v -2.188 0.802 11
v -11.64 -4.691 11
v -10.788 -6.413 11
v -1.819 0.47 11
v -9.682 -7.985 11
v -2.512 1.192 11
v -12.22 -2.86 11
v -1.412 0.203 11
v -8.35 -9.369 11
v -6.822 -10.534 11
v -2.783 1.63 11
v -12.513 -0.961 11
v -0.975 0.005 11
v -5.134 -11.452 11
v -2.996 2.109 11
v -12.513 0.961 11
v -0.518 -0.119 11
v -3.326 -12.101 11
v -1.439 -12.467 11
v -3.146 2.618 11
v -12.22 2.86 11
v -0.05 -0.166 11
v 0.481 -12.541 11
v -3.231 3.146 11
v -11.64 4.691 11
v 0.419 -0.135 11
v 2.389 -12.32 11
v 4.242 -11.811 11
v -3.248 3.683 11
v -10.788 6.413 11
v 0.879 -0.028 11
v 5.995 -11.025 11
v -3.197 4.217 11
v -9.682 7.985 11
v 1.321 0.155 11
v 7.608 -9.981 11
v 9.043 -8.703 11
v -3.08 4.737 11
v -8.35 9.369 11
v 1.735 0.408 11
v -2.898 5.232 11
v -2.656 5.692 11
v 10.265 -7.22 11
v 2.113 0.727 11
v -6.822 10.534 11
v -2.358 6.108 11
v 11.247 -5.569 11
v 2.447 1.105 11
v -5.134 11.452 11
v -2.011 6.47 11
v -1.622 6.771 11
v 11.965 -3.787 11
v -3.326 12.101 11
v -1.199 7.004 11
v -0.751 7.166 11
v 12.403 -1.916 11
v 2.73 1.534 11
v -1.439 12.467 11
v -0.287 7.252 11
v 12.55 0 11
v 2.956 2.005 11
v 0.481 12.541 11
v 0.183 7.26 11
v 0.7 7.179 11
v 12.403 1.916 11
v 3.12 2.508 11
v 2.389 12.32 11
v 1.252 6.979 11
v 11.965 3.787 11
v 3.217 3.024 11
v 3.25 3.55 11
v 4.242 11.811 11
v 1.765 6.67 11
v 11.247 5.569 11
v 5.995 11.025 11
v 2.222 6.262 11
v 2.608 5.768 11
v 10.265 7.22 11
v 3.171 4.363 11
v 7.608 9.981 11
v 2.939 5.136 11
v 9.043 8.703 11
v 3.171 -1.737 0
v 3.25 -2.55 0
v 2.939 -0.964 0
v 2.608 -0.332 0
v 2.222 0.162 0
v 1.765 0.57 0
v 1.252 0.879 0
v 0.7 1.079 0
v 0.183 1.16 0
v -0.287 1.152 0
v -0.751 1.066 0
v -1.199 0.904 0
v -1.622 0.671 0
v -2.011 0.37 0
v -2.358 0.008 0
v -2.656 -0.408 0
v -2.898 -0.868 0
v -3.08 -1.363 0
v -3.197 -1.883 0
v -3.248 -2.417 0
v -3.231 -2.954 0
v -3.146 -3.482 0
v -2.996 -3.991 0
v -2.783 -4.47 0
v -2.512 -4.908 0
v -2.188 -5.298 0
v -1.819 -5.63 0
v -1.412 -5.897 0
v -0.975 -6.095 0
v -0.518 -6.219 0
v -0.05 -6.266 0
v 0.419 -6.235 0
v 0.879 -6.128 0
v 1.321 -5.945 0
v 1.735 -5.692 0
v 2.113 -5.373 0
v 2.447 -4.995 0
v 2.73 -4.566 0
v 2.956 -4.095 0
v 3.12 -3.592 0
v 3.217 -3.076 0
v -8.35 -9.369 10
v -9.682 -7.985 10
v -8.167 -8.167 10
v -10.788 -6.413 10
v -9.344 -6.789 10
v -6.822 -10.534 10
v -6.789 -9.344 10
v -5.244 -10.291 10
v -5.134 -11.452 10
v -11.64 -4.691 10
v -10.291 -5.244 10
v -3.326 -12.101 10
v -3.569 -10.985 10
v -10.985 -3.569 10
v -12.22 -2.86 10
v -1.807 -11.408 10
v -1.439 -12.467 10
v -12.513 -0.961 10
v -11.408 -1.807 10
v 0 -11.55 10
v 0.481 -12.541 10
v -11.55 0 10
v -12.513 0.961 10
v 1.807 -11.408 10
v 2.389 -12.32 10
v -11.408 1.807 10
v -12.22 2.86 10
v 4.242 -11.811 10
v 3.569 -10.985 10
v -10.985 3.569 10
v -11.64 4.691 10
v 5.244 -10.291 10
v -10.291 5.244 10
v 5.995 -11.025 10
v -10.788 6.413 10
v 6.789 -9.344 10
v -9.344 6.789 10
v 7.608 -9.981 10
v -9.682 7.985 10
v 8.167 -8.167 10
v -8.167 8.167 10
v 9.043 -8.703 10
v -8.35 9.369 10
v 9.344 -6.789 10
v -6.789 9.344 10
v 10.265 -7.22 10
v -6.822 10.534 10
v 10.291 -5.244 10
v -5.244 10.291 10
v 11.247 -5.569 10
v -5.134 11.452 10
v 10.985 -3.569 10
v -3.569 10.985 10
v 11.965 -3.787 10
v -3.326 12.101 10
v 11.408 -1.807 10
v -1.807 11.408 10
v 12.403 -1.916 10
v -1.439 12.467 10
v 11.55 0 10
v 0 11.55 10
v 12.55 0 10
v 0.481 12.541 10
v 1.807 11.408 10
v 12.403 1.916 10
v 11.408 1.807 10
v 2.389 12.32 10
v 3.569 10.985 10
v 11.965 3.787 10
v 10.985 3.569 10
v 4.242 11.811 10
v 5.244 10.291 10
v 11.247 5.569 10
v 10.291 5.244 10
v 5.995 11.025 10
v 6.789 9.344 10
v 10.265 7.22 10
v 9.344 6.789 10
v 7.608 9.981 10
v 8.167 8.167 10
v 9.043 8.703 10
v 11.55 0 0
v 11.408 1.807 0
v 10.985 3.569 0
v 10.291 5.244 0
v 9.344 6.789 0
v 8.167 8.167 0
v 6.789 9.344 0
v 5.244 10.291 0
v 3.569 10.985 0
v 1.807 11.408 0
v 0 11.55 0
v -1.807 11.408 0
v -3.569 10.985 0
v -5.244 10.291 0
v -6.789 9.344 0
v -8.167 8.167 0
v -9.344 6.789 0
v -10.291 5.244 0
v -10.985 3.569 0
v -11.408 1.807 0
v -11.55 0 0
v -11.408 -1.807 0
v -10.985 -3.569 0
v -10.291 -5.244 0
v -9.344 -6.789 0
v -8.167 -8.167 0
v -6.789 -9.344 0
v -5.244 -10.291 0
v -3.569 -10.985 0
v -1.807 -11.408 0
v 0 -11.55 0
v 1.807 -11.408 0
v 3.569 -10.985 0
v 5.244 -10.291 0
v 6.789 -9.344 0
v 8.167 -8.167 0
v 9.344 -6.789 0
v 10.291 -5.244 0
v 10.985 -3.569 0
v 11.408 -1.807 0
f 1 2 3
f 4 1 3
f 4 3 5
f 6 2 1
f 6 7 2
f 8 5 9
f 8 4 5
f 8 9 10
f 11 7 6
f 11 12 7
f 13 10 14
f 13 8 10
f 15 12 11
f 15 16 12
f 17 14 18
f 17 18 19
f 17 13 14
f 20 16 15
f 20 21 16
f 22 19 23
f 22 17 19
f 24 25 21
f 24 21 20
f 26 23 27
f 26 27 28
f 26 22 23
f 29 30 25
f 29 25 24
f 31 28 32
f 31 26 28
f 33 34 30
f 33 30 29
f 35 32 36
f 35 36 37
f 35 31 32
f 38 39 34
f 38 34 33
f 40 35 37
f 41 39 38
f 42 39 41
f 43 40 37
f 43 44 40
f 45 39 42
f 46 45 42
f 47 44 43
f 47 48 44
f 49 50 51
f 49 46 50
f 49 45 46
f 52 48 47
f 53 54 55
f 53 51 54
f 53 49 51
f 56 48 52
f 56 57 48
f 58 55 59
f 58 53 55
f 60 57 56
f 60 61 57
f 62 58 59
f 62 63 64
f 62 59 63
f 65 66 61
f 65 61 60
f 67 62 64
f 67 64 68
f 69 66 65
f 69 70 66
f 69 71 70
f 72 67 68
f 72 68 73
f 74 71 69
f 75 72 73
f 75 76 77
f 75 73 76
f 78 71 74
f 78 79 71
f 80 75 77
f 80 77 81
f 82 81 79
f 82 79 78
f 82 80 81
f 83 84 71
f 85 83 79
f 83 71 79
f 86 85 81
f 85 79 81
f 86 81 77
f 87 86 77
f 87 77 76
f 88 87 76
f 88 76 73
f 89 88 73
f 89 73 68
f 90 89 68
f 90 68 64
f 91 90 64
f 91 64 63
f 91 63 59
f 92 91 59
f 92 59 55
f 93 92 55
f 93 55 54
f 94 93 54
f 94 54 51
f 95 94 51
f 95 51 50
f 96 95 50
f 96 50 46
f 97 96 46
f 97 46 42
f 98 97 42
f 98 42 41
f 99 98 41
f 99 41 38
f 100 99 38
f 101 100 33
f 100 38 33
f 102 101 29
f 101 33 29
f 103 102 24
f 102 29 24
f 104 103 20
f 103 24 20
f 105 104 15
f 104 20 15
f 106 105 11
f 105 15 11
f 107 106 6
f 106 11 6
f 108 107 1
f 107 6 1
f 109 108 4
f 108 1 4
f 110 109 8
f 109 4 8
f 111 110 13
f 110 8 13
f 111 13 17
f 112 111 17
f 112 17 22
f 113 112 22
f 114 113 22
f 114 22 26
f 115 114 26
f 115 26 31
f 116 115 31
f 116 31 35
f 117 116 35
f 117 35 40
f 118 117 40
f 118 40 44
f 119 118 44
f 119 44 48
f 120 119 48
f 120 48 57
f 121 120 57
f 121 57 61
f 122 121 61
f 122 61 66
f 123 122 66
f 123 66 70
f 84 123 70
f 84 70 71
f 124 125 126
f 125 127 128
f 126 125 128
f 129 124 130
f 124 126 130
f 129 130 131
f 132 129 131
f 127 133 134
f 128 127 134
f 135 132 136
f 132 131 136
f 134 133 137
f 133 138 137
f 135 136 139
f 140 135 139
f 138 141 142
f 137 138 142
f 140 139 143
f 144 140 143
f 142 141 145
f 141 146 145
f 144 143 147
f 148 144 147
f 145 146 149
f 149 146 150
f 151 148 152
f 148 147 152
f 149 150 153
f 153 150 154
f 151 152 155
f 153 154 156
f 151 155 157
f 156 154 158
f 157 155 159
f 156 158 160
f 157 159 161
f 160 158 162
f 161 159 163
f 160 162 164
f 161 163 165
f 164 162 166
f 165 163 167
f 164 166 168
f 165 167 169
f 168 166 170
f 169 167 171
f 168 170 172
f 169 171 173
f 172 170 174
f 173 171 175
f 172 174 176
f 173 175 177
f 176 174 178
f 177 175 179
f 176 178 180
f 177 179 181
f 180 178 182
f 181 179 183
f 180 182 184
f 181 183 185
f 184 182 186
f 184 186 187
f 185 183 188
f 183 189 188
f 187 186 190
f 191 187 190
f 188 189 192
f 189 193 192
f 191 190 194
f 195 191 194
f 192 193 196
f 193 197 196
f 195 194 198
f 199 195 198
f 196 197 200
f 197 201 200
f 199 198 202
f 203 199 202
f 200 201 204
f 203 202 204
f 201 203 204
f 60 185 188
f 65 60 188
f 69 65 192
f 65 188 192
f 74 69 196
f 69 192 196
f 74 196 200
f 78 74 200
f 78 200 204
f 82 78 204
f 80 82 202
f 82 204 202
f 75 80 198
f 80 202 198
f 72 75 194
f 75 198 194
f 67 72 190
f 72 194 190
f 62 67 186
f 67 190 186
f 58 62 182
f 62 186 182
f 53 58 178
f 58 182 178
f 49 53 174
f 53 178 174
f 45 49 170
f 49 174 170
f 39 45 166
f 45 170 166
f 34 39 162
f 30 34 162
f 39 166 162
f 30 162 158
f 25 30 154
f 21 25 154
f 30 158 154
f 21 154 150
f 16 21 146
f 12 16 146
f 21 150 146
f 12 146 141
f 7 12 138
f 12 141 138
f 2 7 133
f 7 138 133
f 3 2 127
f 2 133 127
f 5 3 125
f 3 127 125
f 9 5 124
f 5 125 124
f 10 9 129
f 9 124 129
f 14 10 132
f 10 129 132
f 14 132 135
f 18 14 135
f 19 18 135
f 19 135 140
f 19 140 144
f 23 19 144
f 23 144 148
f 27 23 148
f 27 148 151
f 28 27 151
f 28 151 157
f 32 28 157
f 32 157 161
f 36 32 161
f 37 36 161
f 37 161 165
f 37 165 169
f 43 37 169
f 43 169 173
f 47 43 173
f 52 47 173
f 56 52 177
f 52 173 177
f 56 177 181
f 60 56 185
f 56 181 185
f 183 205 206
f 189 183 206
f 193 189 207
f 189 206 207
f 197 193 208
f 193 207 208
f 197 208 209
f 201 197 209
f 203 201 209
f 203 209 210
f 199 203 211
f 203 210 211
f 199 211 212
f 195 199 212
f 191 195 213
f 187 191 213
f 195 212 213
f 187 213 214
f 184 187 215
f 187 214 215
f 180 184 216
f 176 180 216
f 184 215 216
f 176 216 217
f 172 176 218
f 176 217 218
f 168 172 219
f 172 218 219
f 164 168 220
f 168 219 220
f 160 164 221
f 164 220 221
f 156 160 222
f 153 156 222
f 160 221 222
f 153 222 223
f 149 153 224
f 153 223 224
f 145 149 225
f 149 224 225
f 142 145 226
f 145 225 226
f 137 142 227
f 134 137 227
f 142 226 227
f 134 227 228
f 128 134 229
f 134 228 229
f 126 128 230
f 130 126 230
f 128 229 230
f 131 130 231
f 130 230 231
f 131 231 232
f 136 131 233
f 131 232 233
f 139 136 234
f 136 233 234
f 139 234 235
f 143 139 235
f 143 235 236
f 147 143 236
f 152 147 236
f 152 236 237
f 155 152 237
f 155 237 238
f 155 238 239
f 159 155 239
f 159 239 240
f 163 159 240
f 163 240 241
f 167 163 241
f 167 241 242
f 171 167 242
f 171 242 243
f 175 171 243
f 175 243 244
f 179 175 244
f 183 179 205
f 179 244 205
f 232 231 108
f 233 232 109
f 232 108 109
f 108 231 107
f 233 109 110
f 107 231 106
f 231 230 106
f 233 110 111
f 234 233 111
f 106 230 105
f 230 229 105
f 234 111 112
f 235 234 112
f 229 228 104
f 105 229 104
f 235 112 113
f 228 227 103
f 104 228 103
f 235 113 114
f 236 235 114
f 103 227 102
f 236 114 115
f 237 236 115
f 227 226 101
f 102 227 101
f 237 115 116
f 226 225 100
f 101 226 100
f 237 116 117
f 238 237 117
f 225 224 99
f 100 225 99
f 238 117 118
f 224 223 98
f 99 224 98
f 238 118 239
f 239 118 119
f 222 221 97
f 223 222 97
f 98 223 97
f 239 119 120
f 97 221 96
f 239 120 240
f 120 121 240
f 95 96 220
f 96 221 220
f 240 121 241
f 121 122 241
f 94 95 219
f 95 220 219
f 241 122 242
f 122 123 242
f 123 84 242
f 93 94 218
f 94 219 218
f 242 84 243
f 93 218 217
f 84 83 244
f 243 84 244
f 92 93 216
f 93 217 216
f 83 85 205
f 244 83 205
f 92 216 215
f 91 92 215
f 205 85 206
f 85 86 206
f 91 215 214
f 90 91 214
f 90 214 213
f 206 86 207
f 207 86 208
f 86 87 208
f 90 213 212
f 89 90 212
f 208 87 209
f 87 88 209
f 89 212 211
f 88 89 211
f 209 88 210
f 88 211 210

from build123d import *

# Parameters (mm, degrees)
F0_R     = 11.55
F1_DEPTH = 10
F2_R     = 12.55
F2_R_2   = 11.55
F3_DEPTH = 1
F7_R     = 3.25
F8_DEPTH = 27.57


with BuildPart() as f1:
    # F0 (on Top) → F1 (new body)
    with BuildSketch(Plane.XY):
        Circle(F0_R)
    extrude(amount=F1_DEPTH)

    # F2 (on face) → F3 (join)
    with BuildSketch(Plane.XY.offset(10)):
        Circle(F2_R)
        Circle(F2_R_2, mode=Mode.SUBTRACT)
        Circle(F2_R_2)
    extrude(amount=F3_DEPTH)

    # F7 (on face) → F8 (cut)
    with BuildSketch(Plane(origin=(0, 8.195943, 14.779569), x_dir=(1, 0, 0), z_dir=(0, 0.484968, 0.874532))):
        with Locations((0, -2.230057)):
            Circle(F7_R)
    extrude(amount=-F8_DEPTH, mode=Mode.SUBTRACT)


solid = f1.part
